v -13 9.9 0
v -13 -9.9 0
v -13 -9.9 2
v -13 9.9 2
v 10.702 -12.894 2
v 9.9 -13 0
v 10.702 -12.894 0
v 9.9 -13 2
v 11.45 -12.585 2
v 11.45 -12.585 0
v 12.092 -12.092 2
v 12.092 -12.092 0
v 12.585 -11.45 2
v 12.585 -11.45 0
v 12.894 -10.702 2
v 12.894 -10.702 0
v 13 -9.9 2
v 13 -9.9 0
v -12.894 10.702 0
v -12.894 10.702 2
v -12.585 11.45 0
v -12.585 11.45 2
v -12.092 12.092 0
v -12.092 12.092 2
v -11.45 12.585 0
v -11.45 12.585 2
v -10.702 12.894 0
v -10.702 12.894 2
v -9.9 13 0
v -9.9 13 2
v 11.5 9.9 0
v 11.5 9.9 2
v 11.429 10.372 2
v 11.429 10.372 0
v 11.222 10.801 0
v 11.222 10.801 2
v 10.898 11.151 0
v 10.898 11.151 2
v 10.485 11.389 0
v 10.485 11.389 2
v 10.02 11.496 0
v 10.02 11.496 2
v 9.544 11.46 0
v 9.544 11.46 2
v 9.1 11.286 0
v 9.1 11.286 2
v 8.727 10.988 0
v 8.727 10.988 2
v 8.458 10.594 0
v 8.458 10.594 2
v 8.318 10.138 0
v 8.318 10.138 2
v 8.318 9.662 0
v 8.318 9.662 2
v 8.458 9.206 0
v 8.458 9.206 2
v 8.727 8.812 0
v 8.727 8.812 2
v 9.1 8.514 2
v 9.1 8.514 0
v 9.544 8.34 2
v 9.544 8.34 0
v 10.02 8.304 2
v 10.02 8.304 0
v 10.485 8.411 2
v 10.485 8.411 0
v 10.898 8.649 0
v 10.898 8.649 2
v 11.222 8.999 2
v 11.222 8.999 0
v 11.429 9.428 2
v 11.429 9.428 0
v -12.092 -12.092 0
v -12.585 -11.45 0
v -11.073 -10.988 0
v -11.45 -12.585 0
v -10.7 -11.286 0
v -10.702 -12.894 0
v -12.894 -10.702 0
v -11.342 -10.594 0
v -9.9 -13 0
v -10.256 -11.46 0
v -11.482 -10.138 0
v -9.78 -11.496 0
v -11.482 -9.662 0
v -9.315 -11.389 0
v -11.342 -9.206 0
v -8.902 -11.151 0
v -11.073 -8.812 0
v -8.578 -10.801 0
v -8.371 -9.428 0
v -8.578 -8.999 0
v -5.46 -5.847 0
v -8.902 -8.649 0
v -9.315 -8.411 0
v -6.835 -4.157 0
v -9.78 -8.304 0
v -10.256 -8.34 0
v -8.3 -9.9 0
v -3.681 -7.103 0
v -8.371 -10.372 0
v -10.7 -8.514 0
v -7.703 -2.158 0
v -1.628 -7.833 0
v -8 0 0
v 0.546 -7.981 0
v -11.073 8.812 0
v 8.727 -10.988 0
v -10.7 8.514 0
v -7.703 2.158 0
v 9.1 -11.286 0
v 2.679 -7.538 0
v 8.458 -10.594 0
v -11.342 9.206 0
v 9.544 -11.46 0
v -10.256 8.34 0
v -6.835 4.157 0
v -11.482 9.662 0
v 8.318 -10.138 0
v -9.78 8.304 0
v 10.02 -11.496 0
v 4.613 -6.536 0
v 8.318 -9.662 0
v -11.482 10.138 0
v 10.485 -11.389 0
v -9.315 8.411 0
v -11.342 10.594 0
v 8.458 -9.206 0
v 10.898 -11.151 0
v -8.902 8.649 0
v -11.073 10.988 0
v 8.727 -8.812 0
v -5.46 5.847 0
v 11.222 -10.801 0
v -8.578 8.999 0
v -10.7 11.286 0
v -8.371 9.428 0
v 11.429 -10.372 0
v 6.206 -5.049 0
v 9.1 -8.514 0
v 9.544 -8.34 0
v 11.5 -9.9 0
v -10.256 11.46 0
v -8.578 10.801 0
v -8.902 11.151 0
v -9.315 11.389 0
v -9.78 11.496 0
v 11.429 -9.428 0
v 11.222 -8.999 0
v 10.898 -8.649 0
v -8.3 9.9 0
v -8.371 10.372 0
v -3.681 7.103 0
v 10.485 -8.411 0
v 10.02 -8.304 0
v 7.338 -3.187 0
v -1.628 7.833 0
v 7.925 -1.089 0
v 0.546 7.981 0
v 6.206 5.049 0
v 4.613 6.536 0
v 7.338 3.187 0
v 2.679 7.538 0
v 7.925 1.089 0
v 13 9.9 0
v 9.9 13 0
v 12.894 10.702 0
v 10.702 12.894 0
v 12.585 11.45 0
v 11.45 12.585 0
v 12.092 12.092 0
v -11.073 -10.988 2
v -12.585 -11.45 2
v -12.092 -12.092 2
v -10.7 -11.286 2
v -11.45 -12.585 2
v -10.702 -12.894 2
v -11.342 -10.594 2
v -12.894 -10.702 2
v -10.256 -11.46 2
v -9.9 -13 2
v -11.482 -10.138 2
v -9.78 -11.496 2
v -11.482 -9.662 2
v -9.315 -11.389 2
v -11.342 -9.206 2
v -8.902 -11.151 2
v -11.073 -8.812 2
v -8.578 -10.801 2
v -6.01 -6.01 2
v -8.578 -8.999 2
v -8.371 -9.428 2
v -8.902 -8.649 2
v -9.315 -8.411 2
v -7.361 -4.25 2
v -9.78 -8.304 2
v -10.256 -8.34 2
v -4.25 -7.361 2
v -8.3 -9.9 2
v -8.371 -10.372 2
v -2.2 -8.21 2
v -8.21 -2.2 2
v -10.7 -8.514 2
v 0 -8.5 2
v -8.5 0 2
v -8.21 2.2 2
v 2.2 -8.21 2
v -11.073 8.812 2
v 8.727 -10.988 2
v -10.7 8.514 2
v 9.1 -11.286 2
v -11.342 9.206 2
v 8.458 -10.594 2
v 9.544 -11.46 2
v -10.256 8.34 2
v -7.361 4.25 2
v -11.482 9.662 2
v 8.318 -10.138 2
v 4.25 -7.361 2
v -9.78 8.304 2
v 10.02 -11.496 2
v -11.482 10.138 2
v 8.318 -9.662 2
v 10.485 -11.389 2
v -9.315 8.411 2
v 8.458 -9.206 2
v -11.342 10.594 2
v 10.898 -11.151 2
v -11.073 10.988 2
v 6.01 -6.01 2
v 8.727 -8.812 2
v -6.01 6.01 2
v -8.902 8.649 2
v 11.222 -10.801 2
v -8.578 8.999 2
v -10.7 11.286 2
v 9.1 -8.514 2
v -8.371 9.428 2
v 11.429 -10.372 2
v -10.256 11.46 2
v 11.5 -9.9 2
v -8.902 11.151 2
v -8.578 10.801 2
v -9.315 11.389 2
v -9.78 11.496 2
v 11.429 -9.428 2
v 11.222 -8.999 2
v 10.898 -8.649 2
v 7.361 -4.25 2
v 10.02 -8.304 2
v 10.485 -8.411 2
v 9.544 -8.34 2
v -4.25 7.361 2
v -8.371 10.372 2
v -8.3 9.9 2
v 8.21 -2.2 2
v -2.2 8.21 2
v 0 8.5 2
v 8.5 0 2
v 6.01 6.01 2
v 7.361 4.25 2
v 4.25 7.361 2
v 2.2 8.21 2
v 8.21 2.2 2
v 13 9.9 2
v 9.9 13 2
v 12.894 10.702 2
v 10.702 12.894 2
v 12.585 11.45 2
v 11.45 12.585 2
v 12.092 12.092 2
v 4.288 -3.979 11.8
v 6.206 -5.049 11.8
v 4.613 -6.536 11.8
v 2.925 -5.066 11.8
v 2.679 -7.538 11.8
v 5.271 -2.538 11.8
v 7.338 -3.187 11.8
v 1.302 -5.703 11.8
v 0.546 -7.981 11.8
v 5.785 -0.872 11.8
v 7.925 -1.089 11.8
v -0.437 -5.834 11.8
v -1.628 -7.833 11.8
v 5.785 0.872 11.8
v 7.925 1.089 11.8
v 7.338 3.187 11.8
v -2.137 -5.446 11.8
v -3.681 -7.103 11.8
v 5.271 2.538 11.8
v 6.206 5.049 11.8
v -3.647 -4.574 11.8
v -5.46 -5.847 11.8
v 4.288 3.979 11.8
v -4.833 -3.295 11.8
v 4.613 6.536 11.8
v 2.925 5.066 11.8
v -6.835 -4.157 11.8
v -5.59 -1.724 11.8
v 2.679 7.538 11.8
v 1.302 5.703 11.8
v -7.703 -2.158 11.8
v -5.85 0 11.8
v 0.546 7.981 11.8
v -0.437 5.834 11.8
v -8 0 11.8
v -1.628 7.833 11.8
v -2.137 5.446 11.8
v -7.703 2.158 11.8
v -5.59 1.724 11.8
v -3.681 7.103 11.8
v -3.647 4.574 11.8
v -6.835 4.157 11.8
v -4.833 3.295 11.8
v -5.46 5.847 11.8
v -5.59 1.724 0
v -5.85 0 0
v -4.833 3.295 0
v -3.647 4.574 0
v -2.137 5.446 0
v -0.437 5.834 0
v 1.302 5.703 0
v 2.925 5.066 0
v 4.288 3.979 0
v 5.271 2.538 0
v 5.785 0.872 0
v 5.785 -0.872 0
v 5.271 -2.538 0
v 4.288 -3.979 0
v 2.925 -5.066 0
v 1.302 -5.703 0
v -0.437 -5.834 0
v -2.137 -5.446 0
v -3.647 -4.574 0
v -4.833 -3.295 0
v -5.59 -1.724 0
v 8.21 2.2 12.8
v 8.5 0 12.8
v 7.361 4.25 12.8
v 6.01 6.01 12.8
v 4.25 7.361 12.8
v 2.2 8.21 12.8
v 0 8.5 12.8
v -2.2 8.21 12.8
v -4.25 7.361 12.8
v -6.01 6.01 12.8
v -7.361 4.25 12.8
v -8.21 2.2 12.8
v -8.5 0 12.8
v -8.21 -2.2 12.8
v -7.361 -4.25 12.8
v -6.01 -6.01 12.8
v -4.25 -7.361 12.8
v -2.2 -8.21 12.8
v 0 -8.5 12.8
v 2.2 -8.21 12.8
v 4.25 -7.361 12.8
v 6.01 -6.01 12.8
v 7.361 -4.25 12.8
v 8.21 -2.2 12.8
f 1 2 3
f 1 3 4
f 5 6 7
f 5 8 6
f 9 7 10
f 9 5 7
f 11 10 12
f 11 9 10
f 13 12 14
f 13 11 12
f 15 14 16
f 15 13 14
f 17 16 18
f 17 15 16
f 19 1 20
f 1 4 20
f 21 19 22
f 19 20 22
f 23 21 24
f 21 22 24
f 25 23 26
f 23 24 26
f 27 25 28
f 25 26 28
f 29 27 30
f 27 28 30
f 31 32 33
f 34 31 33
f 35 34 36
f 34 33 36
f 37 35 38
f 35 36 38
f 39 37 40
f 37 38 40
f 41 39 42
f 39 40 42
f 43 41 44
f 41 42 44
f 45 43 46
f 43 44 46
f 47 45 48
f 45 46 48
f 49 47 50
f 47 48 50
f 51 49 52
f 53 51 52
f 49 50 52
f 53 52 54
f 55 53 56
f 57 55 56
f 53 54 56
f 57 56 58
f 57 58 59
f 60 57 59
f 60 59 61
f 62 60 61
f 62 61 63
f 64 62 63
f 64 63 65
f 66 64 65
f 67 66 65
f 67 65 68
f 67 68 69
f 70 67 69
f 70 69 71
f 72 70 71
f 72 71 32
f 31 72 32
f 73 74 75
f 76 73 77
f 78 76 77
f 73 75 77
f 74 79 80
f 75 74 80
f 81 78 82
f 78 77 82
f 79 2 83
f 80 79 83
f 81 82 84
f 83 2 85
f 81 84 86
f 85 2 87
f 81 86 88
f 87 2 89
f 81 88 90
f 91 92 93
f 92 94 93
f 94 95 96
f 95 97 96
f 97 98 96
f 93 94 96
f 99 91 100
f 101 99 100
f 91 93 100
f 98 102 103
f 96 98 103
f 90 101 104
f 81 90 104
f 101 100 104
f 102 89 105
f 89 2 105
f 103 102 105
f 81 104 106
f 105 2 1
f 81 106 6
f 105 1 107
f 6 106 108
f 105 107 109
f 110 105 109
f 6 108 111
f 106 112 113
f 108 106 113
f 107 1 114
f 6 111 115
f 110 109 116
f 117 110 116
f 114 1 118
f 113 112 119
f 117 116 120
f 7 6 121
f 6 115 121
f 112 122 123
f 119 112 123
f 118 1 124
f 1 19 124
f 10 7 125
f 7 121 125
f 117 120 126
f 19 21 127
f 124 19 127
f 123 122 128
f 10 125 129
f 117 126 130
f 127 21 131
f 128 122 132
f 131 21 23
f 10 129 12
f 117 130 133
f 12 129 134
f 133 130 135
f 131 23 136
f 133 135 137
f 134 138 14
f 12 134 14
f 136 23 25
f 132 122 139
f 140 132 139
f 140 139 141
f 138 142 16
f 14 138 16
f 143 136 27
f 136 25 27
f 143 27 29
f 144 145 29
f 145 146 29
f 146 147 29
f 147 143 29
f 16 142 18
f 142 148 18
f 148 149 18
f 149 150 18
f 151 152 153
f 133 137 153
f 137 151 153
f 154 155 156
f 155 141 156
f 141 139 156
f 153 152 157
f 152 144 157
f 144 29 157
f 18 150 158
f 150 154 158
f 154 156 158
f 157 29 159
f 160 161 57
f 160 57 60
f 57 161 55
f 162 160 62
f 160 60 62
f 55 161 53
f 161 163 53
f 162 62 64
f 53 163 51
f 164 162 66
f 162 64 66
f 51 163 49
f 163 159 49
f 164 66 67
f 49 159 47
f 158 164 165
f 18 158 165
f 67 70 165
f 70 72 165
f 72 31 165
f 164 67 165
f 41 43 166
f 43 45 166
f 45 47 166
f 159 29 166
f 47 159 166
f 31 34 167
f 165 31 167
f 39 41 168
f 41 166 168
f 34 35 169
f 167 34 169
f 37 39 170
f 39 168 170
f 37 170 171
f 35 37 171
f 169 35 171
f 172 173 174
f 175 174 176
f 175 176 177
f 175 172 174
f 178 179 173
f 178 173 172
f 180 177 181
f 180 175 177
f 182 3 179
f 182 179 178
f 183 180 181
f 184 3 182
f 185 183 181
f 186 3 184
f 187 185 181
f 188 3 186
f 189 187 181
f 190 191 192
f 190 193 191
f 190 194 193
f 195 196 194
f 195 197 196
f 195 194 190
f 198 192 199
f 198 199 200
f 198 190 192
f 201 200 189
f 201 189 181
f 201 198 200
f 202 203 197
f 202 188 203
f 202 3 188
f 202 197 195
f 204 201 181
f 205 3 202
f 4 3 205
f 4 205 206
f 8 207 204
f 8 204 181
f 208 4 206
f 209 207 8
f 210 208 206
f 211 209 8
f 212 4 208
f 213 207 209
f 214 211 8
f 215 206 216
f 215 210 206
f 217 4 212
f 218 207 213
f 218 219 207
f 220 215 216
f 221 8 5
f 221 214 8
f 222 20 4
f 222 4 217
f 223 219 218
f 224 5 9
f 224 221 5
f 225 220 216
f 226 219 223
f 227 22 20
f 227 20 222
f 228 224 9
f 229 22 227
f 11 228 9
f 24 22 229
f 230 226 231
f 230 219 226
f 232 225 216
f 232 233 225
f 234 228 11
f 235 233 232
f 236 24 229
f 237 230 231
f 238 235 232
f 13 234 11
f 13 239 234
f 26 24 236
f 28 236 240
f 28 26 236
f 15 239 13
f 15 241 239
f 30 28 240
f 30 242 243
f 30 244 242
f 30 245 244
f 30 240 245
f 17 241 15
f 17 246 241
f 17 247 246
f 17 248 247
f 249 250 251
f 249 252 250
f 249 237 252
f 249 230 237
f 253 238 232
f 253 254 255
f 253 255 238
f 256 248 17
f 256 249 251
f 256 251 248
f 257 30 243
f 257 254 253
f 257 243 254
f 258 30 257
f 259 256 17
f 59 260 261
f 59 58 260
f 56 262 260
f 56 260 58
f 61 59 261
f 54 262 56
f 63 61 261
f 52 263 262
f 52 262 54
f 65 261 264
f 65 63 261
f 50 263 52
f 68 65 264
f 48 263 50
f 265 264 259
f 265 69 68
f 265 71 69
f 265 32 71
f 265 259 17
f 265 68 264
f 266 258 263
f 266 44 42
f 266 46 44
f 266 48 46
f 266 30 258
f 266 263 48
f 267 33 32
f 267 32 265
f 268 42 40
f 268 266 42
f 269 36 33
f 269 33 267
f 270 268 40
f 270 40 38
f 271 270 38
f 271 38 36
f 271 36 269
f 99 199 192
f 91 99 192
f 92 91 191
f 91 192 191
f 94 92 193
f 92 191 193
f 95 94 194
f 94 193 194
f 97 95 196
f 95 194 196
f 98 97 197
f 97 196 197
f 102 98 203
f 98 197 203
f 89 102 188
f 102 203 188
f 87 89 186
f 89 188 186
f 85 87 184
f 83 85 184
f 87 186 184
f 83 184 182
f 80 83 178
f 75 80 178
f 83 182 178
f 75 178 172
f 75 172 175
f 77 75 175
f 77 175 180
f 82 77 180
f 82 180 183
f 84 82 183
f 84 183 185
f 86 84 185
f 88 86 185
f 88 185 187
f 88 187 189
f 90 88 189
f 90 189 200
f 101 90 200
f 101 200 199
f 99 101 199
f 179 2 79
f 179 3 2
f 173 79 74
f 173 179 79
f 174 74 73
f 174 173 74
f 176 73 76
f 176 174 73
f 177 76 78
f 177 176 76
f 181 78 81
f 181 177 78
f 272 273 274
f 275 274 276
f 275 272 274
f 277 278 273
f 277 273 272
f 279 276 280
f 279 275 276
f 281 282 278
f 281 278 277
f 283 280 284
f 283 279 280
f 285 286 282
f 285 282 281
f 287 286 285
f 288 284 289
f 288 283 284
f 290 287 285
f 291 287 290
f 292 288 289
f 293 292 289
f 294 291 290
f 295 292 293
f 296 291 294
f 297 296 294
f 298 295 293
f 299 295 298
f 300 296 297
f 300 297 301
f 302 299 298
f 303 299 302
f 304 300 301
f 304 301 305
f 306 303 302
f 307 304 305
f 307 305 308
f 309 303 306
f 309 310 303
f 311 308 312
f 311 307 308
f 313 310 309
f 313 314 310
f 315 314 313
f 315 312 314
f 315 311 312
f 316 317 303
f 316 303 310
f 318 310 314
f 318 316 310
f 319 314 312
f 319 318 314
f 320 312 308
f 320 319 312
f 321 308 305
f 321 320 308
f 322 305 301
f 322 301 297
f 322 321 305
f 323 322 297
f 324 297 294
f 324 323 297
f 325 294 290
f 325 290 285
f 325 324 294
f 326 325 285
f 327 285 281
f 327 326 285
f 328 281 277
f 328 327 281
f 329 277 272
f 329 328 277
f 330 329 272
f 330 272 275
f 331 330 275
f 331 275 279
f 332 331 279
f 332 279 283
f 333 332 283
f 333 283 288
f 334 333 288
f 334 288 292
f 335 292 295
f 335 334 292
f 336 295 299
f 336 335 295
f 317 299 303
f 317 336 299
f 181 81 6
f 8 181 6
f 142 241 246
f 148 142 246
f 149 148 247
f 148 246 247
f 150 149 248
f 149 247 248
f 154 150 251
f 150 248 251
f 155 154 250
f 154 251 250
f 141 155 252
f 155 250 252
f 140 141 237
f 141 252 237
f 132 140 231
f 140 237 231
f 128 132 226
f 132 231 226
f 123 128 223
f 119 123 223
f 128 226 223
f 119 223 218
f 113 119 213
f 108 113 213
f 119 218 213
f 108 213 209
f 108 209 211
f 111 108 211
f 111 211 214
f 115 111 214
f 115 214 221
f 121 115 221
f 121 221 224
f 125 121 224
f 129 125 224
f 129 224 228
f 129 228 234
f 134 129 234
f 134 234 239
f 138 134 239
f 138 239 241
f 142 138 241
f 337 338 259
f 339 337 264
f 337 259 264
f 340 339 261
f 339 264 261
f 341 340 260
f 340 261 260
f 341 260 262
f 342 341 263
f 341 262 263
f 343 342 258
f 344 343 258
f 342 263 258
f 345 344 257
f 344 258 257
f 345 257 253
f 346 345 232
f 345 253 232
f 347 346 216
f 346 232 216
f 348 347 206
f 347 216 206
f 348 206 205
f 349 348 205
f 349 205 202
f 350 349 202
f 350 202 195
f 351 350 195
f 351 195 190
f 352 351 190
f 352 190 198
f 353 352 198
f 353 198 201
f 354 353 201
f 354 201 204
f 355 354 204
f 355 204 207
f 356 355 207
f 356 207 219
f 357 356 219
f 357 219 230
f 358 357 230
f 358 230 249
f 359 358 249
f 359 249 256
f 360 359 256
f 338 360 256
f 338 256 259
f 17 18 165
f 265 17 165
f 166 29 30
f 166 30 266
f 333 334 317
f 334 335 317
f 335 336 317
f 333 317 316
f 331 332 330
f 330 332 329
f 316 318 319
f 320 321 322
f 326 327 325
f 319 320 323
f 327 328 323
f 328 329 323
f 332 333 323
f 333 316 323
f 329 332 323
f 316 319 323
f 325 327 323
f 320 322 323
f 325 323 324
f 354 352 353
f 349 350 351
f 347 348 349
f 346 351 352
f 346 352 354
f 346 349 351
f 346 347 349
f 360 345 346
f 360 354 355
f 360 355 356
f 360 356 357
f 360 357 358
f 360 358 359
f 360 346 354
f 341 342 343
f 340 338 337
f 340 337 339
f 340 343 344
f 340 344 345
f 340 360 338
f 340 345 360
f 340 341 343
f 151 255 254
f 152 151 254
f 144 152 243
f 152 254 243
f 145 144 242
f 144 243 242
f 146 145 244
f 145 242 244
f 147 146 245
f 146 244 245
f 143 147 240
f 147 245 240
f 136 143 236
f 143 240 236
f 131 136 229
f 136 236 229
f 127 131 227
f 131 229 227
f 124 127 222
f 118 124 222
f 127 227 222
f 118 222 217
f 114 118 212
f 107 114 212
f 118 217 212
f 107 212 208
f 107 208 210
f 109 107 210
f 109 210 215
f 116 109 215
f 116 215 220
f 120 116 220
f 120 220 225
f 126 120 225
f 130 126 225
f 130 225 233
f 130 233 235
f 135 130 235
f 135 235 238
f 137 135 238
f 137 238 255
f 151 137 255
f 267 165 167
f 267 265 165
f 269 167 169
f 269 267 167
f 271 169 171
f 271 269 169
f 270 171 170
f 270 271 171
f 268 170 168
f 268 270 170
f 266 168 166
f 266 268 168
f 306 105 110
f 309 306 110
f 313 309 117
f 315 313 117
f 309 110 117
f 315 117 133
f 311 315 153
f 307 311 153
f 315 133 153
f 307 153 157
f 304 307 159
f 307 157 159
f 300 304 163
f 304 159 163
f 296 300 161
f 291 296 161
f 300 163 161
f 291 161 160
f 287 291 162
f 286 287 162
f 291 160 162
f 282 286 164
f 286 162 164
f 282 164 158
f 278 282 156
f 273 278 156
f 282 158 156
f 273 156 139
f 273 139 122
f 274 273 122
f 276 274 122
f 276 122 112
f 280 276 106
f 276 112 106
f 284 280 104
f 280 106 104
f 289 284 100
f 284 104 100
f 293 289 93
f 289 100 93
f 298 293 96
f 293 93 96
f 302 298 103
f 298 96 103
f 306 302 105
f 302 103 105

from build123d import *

# Parameters (mm, degrees)
SKETCH1_W                = 26
SKETCH1_H                = 26
BOSS_EXTRUDE1_DEPTH      = 2
FILLET1_R                = 3.1
SKETCH3_R                = 8.5
BOSS_EXTRUDE2_DEPTH      = 12.8
M3_CLEARANCE_HOLE1_D     = 3.2
M3_CLEARANCE_HOLE1_DEPTH = 5
M3_CLEARANCE_HOLE1_TIP   = 0.96137699
SKETCH7_R                = 8
SKETCH7_R_2              = 5.85
CUT_EXTRUDE1_DEPTH       = 11.8


with BuildPart() as part:
    # Sketch1 → Boss-Extrude1 (new body)
    with BuildSketch(Plane.XY):
        Rectangle(SKETCH1_W, SKETCH1_H)
    extrude(amount=BOSS_EXTRUDE1_DEPTH)

    # Fillet1
    fillet1_edges = [part.edges().sort_by_distance(p)[0] for p in [
        (13, -13, 1),
        (-13, -13, 1),
        (-13, 13, 1),
        (13, 13, 1),
    ]]
    fillet(fillet1_edges, radius=FILLET1_R)

    # Sketch3 → Boss-Extrude2 (add)
    with BuildSketch(Plane.XY):
        Circle(SKETCH3_R)
    extrude(amount=BOSS_EXTRUDE2_DEPTH)

    # M3 Clearance Hole1
    with Locations(Plane(origin=(0, 0, 0), x_dir=(-1, 0, 0), z_dir=(0, 0, -1))):
        with Locations((9.9, 9.9), (9.9, -9.9), (-9.9, -9.9), (-9.9, 9.9)):
            Hole(M3_CLEARANCE_HOLE1_D / 2, depth=M3_CLEARANCE_HOLE1_DEPTH)
            with Locations((0, 0, -(M3_CLEARANCE_HOLE1_DEPTH + M3_CLEARANCE_HOLE1_TIP / 2))):  # 118° drill point
                Cone(0, M3_CLEARANCE_HOLE1_D / 2, M3_CLEARANCE_HOLE1_TIP, mode=Mode.SUBTRACT)

    # Sketch7 → Cut-Extrude1 (cut)
    with BuildSketch(Plane(origin=(0, 0, 0), x_dir=(-1, 0, 0), z_dir=(0, 0, -1))):
        Circle(SKETCH7_R)
        Circle(SKETCH7_R_2, mode=Mode.SUBTRACT)
    extrude(amount=-CUT_EXTRUDE1_DEPTH, mode=Mode.SUBTRACT)


solid = part.part
